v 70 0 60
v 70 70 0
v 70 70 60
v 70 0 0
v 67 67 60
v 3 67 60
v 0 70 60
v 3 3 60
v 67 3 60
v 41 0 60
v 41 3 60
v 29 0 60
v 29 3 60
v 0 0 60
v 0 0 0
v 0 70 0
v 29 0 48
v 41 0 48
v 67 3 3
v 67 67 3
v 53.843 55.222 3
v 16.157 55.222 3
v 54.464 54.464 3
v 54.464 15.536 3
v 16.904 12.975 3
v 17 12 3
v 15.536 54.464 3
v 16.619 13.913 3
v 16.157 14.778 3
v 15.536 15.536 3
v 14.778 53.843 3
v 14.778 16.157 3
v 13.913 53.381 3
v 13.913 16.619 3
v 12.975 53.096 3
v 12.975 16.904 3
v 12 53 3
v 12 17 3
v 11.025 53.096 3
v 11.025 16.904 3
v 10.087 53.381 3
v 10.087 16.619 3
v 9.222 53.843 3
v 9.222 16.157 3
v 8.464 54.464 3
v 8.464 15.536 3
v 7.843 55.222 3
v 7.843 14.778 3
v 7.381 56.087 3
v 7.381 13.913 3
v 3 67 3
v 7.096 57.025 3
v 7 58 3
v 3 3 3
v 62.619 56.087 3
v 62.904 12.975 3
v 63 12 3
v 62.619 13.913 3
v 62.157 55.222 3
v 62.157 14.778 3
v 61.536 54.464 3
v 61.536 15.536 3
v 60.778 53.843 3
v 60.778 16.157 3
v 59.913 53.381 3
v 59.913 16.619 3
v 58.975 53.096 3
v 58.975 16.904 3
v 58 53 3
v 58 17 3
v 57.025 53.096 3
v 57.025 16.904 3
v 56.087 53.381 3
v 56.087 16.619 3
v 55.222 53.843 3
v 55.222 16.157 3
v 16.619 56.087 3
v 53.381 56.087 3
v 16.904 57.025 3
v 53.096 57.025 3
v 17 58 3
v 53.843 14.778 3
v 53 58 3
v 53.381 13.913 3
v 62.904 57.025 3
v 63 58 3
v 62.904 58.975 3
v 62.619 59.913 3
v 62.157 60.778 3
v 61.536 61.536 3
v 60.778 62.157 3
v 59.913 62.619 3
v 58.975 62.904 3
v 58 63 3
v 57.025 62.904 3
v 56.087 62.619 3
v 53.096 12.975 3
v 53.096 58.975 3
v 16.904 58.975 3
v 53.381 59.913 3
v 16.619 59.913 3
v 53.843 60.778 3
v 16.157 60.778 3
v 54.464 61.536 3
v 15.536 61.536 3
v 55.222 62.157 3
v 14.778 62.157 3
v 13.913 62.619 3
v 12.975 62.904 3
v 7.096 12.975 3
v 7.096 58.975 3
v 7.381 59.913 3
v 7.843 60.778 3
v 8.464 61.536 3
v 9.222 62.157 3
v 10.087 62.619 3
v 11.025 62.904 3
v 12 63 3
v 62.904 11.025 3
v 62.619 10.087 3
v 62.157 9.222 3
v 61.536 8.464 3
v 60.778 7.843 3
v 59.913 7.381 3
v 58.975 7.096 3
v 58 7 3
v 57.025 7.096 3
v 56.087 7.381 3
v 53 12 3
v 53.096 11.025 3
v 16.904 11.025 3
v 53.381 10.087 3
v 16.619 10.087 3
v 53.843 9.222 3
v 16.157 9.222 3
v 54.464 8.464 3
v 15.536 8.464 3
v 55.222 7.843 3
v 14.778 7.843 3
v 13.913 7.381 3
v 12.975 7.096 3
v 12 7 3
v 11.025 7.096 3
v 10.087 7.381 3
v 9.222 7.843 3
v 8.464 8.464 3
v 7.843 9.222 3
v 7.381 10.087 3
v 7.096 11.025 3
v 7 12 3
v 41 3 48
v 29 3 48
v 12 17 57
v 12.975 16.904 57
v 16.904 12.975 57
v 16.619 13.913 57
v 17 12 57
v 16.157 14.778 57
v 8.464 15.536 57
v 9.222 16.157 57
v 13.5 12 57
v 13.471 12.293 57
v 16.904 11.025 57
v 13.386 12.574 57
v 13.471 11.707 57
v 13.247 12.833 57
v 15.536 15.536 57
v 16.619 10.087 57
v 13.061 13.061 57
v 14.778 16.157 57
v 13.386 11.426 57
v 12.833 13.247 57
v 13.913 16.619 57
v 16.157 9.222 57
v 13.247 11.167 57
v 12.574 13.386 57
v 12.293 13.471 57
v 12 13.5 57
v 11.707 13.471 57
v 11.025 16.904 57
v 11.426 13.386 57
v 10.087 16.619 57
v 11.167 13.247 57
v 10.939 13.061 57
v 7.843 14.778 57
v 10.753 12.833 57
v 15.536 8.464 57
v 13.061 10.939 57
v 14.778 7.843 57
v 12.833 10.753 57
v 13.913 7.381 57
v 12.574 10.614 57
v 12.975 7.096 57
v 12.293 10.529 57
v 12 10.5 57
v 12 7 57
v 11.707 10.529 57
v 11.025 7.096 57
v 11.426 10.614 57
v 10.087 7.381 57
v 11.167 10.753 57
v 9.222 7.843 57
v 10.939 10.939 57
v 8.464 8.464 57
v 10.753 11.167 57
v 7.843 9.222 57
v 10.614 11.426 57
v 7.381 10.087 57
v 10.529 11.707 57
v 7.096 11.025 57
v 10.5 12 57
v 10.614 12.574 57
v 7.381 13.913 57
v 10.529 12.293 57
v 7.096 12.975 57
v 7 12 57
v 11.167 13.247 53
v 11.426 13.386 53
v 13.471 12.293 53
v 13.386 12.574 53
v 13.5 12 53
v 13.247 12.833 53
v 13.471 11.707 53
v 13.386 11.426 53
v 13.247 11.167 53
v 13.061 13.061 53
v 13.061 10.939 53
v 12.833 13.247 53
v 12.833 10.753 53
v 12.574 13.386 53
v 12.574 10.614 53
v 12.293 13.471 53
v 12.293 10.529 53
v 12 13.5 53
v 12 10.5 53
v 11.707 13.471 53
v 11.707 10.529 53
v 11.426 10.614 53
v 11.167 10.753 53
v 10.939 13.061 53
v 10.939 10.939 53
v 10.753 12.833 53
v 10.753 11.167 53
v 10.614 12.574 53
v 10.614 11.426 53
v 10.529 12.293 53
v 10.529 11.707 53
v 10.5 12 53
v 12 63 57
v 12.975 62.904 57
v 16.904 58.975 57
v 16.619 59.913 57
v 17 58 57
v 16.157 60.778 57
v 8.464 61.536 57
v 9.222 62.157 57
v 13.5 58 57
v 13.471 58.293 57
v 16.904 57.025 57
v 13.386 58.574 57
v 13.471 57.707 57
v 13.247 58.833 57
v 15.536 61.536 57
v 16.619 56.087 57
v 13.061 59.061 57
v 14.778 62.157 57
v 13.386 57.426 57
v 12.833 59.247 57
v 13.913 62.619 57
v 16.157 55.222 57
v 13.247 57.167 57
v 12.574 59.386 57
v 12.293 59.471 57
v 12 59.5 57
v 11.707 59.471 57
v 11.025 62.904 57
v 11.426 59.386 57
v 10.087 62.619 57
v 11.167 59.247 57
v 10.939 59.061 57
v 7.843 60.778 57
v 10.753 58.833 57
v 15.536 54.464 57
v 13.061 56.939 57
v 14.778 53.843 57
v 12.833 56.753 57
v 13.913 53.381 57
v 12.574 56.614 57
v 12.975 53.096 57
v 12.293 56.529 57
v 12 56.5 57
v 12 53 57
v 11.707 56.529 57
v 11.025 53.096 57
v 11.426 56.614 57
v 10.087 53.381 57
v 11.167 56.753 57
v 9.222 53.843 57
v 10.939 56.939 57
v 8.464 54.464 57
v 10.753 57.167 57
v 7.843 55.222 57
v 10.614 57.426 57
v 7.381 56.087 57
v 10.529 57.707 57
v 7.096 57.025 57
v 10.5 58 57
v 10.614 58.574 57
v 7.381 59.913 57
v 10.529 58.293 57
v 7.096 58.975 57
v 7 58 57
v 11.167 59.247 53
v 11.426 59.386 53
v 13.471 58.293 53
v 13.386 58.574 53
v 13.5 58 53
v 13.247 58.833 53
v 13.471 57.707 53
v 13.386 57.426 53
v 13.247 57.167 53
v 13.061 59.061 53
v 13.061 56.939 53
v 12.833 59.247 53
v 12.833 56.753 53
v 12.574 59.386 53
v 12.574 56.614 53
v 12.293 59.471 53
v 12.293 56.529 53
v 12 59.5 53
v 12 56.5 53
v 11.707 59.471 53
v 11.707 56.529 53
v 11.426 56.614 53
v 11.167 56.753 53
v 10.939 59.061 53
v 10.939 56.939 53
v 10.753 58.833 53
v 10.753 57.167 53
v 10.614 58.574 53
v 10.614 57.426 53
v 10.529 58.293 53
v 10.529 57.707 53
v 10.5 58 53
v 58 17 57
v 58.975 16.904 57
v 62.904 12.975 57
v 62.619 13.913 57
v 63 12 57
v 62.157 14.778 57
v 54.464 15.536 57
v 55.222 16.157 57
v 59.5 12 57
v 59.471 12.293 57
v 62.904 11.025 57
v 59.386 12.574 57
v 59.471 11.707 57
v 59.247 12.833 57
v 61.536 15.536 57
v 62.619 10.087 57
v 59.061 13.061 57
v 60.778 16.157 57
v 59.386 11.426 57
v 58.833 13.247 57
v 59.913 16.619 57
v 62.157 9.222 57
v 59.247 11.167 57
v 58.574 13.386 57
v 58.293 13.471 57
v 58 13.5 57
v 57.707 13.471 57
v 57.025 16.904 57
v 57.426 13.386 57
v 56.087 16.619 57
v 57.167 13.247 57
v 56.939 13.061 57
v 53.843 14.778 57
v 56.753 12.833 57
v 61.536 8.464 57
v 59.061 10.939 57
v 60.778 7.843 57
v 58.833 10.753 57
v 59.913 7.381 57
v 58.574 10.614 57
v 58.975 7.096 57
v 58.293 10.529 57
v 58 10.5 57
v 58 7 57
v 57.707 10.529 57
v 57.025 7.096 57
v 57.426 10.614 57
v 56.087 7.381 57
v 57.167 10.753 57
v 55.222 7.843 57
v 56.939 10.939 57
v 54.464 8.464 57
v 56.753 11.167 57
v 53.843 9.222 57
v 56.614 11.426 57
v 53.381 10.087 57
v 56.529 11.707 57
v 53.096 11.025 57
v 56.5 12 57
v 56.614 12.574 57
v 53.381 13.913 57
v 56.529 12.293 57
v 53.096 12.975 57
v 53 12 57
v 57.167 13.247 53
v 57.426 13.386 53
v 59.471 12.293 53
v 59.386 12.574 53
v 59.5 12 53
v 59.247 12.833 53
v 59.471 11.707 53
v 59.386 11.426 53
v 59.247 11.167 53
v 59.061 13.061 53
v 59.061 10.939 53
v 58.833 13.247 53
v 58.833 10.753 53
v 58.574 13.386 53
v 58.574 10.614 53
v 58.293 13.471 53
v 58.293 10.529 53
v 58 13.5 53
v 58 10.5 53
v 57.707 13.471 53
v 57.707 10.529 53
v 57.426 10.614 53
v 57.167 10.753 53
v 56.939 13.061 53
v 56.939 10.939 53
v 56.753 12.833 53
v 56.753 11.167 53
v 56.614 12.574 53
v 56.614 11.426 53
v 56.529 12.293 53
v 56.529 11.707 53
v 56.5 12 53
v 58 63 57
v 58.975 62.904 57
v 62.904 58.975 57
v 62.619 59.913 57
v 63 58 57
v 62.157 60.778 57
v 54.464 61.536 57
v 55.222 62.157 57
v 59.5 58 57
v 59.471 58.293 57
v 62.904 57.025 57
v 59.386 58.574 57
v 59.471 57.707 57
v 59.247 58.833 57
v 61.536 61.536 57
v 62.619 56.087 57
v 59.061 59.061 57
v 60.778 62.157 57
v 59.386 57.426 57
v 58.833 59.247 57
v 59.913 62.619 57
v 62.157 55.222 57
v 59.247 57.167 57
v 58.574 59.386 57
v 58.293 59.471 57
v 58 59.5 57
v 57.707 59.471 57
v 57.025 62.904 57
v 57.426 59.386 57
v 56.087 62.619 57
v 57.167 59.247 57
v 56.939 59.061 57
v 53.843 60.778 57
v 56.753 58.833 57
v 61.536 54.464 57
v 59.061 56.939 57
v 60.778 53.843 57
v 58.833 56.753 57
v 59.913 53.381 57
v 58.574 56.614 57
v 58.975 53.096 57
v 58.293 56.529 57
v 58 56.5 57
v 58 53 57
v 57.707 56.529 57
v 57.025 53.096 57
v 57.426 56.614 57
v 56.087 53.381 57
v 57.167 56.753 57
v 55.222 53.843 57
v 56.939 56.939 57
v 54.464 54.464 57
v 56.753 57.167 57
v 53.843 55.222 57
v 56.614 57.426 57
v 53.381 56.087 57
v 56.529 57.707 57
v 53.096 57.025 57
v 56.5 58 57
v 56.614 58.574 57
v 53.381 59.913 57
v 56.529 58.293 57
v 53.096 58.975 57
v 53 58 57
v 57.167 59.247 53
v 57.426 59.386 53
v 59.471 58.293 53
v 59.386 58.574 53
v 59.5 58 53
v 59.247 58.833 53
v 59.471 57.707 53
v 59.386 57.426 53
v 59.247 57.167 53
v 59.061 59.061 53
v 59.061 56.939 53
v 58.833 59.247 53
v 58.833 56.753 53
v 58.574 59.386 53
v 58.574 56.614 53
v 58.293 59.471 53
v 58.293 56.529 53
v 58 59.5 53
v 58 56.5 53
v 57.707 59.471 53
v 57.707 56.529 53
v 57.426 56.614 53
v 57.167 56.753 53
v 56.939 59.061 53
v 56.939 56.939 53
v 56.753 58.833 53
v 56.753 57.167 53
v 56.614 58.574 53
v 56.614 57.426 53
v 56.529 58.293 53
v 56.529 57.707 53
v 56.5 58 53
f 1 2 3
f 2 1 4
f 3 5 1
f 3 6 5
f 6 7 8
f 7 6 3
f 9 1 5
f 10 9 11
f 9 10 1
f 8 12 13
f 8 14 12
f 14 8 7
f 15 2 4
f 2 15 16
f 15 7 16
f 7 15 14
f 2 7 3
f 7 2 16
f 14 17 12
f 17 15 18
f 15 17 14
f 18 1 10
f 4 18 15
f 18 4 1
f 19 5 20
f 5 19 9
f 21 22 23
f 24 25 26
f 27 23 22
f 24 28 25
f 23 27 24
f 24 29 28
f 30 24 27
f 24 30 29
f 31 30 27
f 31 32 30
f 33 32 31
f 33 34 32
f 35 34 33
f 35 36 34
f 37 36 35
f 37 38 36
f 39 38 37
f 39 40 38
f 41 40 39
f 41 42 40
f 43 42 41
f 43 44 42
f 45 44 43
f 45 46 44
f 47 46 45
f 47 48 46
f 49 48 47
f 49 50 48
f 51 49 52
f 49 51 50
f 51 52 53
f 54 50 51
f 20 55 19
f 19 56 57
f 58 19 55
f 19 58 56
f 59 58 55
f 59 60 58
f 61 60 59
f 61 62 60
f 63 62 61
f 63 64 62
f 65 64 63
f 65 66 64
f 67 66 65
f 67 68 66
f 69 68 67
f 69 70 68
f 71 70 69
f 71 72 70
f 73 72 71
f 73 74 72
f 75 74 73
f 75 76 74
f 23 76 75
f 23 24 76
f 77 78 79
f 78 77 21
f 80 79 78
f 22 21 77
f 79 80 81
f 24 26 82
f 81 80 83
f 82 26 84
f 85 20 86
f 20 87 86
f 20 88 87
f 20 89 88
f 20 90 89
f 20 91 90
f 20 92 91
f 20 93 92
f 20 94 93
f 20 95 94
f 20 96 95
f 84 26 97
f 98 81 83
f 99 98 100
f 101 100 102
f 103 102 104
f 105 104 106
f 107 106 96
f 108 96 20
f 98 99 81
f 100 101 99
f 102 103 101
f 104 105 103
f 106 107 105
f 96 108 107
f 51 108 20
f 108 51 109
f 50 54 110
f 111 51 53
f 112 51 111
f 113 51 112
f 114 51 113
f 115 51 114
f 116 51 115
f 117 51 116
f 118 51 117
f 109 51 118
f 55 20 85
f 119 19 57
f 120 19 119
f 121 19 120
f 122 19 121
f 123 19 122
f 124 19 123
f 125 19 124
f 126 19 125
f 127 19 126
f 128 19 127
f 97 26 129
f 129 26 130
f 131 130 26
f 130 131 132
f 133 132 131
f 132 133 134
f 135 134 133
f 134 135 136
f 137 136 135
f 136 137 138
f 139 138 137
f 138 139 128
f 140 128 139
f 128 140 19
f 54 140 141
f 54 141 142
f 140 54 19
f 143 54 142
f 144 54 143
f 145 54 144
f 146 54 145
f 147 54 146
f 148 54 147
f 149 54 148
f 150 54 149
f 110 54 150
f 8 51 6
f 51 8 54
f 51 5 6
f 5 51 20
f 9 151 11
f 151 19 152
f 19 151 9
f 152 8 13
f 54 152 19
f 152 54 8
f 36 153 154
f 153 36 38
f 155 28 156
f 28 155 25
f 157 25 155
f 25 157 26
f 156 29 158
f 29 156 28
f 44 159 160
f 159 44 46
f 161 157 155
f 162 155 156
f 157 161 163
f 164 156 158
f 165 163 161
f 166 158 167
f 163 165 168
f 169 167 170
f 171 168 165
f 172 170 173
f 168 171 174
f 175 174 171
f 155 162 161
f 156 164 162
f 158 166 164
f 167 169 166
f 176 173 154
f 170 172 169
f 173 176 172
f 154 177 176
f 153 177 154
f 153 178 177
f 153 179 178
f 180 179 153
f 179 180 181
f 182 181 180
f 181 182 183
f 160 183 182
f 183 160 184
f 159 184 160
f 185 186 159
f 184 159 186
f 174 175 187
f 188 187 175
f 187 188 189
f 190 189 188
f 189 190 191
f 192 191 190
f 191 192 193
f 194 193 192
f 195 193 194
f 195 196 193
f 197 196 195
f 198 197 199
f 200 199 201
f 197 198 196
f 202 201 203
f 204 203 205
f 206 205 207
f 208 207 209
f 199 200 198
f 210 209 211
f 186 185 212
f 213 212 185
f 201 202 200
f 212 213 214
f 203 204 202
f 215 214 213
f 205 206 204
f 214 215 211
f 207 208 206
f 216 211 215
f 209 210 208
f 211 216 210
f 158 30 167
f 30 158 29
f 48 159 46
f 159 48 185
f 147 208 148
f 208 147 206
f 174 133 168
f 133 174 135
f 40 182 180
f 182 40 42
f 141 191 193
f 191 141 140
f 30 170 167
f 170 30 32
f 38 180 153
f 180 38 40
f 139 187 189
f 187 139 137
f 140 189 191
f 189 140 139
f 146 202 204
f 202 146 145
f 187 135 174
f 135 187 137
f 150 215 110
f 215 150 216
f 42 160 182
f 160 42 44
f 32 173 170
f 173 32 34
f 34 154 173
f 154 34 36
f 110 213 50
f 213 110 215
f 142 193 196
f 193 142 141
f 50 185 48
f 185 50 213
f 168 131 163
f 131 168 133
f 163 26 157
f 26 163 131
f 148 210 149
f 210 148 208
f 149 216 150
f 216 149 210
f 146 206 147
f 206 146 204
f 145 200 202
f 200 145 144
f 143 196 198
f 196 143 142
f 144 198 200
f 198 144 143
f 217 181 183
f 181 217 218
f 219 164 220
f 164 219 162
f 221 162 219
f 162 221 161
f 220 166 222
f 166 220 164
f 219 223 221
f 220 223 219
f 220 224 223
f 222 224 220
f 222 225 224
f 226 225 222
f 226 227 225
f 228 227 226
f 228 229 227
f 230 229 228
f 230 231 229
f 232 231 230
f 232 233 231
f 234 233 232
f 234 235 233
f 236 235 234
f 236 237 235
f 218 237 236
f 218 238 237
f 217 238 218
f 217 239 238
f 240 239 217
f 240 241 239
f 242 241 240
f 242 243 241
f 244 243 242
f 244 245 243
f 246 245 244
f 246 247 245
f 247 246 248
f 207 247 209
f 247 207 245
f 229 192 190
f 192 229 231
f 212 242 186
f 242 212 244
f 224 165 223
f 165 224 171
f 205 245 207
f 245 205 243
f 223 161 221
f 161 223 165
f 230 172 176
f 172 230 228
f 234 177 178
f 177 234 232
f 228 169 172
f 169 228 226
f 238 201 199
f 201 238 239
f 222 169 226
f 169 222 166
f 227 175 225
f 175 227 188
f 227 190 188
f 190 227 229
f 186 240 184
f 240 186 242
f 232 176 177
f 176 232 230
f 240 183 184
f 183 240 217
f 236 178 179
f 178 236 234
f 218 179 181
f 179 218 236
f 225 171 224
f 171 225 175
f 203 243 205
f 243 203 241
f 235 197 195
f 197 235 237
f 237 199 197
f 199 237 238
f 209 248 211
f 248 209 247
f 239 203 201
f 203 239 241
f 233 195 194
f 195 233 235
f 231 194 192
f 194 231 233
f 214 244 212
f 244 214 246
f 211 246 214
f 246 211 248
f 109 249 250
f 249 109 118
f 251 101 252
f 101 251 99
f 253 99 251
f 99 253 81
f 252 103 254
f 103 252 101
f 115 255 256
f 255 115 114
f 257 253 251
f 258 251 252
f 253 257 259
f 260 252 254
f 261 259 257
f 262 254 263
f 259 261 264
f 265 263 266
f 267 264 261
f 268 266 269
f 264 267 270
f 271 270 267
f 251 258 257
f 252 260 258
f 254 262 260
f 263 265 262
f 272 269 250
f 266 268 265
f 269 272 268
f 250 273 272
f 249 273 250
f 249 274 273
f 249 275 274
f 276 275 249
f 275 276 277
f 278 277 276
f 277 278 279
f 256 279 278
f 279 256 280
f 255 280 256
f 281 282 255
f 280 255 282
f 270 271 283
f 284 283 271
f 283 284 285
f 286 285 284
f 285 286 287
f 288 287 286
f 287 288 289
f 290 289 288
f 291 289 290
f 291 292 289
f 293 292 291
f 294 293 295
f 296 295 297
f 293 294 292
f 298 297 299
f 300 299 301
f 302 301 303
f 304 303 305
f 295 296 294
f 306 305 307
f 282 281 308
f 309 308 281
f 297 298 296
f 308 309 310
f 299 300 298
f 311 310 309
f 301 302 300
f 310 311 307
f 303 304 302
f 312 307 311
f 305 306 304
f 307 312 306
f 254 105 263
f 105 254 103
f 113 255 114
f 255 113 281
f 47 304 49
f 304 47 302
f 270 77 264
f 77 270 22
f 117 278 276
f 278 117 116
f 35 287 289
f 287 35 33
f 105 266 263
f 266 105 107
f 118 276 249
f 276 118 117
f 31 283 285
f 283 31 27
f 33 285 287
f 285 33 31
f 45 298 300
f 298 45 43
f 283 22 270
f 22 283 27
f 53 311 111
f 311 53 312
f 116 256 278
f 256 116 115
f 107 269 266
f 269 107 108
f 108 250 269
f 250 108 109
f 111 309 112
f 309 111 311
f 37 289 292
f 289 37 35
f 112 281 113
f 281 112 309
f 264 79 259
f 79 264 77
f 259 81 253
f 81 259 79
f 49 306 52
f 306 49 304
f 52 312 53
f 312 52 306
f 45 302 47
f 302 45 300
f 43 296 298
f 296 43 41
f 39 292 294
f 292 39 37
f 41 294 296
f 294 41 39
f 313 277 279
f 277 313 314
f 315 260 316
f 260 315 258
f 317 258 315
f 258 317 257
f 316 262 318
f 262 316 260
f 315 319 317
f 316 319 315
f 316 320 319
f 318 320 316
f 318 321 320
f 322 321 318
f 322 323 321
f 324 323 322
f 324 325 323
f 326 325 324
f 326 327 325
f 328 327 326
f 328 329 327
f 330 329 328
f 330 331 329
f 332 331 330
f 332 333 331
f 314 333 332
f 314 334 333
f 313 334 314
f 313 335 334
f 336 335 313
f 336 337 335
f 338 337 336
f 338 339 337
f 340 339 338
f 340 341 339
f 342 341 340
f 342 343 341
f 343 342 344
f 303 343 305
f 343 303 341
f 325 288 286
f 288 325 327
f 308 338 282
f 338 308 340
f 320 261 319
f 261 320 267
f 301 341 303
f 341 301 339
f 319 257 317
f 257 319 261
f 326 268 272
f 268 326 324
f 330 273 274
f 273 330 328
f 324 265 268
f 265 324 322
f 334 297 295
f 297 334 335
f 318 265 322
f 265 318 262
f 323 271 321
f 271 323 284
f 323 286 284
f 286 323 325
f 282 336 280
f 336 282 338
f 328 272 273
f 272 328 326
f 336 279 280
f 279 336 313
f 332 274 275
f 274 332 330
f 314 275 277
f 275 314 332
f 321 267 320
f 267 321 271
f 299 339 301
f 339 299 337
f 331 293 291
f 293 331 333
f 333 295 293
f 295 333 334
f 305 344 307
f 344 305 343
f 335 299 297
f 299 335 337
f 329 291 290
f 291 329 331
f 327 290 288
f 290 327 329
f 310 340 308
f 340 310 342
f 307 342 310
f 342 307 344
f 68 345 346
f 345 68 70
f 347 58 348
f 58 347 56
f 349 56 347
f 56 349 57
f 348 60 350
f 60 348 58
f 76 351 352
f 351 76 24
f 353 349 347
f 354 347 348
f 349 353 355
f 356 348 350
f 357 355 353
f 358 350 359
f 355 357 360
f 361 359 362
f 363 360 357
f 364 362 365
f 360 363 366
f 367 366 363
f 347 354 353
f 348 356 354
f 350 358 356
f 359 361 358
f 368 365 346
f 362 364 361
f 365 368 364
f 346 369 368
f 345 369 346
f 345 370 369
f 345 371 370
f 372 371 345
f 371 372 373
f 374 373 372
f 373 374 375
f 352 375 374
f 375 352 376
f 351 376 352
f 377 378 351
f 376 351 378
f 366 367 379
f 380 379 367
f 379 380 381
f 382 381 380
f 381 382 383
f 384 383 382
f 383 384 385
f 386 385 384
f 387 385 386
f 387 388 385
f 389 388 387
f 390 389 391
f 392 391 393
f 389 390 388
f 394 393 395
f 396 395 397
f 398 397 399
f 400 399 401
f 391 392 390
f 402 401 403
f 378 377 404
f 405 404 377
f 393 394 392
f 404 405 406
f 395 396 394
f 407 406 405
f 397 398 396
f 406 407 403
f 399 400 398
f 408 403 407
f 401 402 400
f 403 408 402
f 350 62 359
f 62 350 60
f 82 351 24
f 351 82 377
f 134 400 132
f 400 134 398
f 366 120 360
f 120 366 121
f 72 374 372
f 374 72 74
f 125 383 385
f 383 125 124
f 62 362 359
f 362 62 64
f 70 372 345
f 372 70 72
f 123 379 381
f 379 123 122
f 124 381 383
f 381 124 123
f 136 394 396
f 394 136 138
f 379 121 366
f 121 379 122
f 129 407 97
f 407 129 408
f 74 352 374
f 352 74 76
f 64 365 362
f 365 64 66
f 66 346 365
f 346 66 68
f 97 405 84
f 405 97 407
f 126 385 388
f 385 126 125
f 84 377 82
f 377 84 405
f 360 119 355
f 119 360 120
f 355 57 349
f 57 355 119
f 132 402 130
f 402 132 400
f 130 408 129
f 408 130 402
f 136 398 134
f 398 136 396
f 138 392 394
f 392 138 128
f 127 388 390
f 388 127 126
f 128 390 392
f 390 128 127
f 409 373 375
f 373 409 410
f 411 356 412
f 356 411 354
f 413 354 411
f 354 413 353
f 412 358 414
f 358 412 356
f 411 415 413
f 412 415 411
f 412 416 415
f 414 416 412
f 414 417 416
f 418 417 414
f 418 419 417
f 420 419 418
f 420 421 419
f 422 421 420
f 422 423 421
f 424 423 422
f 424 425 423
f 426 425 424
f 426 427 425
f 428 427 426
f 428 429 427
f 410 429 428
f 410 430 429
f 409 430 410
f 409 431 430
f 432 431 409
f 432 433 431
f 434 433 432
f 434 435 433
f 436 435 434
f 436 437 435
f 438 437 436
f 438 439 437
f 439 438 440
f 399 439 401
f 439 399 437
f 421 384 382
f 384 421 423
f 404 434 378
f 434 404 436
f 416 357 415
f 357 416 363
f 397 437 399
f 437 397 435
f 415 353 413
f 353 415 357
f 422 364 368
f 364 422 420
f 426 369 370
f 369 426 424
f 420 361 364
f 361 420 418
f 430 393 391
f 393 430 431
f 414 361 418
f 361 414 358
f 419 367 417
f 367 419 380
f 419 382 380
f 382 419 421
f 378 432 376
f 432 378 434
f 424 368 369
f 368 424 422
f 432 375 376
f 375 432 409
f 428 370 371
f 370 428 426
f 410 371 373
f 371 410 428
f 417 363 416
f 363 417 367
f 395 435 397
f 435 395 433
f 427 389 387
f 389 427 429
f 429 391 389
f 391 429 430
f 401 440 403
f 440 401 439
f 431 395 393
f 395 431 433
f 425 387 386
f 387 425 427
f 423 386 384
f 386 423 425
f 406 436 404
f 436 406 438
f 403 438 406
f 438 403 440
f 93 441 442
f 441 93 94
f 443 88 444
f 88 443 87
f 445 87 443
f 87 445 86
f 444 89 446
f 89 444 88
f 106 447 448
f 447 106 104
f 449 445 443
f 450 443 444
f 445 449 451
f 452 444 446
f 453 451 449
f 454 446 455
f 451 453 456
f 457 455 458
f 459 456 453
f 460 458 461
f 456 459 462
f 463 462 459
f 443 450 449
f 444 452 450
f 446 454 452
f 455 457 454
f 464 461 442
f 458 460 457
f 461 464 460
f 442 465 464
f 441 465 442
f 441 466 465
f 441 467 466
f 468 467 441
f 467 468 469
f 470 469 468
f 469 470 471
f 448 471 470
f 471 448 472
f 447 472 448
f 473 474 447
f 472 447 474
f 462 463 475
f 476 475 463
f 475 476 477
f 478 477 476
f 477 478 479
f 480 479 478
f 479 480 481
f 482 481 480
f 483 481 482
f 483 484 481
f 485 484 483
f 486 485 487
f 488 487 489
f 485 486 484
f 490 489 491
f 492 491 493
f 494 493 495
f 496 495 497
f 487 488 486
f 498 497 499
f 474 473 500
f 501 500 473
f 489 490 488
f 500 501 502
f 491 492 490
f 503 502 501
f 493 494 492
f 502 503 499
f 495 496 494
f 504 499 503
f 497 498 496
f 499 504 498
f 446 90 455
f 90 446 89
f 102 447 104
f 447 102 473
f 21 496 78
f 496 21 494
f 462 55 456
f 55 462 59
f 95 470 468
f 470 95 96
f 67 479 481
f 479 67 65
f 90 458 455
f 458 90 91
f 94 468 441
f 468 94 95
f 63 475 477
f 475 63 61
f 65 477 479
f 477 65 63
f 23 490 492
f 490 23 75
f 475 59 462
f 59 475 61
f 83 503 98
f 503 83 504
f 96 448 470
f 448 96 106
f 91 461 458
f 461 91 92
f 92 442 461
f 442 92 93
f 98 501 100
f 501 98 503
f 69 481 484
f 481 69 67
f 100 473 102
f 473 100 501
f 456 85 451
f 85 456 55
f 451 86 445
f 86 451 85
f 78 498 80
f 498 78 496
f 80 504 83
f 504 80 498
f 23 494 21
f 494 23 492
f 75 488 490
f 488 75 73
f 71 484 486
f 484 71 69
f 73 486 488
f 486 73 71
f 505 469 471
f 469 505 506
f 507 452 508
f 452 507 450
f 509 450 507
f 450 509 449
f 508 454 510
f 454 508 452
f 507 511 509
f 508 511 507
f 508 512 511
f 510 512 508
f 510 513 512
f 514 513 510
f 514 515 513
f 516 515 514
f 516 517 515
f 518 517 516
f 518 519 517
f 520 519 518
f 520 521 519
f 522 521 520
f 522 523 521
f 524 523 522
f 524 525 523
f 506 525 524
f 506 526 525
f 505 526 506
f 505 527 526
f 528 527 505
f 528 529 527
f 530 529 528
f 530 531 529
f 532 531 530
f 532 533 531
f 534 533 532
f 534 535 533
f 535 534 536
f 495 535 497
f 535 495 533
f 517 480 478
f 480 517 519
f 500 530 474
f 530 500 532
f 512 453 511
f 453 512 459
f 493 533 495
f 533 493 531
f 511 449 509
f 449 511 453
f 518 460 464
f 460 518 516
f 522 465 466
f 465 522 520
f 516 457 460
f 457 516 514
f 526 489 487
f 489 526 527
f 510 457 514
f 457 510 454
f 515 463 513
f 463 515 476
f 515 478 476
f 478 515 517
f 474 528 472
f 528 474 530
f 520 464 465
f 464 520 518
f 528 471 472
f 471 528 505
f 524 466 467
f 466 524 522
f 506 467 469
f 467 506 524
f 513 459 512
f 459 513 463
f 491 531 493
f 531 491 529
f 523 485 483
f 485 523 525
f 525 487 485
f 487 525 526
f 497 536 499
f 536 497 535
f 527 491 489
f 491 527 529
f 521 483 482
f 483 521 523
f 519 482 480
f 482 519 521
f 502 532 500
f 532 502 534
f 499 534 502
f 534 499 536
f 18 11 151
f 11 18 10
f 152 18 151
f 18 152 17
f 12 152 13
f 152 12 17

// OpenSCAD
$fn = 32;

// ----------------------------------------------------------------------
// Enclosure box: both enclosure
// ----------------------------------------------------------------------

// --- parameters (mm) ---
box_l = 70;               // outer length, X
box_w = 70;               // outer width, Y
box_h = 60;               // outer height
wall_t = 3;               // wall thickness
boss_r = 5;               // corner boss radius
hole_r = 1.5;             // boss screw hole radius
boss_in = 12;             // boss inset from the corners
notch_w = 12;             // cable notch width
notch_h = 12;             // cable notch height
fit_tol = 0.02;           // tolerance for press fits, mm
free_tol = 0.2;           // tolerance for clearance fits, mm

inner_h = box_h - wall_t;  // cavity depth
boss_h = inner_h - 2;  // corner boss height

difference() {
  union() {
    difference() {
      cube([box_l, box_w, box_h]);
      translate([wall_t, wall_t, wall_t])
        cube([box_l - 2 * wall_t, box_w - 2 * wall_t, box_h]);
    }
    for (sx = [0, 1], sy = [0, 1])
      translate([sx ? box_l - boss_in : boss_in,
                 sy ? box_w - boss_in : boss_in, wall_t - 1])
        difference() {
          cylinder(r = boss_r, h = boss_h);
          translate([0, 0, boss_h - 4])
            cylinder(r = hole_r, h = 5);
        }
  }
  translate([box_l / 2 - notch_w / 2, -1, box_h - notch_h])
    cube([notch_w, wall_t + 2, notch_h + 1]);
}
